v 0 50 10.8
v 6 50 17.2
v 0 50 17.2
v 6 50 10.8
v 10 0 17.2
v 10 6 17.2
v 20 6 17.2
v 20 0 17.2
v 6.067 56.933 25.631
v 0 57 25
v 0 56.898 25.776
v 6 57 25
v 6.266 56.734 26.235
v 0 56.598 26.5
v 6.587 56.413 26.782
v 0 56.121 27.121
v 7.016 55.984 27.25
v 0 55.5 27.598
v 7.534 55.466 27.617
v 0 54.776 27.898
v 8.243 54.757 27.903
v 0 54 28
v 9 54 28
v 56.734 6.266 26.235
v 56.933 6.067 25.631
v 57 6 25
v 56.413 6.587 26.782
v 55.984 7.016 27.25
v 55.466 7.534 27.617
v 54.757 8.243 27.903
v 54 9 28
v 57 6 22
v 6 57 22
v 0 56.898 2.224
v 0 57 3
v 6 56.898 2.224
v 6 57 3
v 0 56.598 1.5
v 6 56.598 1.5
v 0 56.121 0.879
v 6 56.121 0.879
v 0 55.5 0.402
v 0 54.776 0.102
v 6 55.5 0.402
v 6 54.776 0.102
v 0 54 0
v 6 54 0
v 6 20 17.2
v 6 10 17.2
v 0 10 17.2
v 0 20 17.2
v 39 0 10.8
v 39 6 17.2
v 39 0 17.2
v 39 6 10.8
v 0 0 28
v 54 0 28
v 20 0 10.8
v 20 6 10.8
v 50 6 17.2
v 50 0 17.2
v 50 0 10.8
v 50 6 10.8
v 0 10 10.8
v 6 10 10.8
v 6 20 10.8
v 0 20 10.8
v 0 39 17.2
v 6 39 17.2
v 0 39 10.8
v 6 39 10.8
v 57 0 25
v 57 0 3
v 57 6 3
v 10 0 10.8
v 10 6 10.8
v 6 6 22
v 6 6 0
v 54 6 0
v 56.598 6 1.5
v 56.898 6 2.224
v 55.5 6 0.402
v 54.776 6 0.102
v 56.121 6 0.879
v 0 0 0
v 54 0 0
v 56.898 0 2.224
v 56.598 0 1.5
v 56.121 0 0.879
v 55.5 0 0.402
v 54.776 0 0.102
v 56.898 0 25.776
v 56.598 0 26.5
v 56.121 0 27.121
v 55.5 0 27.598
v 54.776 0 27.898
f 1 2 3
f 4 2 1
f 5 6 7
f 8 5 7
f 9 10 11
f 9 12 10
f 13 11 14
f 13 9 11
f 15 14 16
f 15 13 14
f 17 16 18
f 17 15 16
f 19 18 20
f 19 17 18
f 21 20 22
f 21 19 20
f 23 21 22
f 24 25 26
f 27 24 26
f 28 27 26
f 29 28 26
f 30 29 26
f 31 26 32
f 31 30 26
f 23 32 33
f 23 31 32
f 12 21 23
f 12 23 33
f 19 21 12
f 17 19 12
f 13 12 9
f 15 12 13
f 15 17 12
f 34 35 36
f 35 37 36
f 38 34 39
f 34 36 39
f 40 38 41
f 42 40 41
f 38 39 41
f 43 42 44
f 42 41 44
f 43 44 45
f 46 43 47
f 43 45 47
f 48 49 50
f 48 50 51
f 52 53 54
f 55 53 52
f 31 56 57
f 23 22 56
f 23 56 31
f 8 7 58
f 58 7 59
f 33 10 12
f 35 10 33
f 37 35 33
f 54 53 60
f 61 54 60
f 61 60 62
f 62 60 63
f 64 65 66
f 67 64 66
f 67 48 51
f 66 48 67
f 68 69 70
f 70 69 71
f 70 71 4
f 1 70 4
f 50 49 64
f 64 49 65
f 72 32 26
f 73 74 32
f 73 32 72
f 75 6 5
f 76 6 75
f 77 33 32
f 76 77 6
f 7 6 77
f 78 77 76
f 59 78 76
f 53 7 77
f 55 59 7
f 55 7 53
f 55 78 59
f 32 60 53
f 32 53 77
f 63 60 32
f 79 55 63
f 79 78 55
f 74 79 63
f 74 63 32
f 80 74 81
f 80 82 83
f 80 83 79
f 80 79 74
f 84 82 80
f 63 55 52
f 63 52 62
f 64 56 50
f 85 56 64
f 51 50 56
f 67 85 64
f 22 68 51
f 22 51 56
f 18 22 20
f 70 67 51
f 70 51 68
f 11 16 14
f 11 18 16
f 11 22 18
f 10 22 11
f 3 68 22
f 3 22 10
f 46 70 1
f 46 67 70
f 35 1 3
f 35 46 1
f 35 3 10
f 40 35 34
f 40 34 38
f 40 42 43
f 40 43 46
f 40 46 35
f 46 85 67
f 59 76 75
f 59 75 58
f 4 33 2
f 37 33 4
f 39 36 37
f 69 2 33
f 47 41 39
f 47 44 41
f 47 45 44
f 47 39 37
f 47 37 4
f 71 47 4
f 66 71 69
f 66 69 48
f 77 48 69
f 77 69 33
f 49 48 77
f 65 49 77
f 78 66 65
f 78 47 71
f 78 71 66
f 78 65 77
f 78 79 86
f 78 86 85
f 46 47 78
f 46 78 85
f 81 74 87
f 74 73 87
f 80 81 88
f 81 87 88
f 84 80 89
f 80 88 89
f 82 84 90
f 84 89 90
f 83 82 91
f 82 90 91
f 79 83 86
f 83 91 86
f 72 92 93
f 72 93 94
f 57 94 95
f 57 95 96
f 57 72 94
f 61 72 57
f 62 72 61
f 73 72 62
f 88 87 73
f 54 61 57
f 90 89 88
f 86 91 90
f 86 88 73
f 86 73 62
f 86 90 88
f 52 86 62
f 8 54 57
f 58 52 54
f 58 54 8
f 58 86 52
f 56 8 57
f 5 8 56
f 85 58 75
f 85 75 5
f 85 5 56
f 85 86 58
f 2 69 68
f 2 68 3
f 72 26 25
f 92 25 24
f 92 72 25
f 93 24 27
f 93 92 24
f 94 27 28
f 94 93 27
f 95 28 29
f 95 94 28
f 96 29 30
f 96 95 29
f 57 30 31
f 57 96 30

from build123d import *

# Parameters (mm, degrees)
AUFSATZ_LINEAR_AUSTRAGEN1_DEPTH = 28
AUFSATZ_LINEAR_AUSTRAGEN2_DEPTH = 6
SKIZZE3_W                       = 6.4
SKIZZE3_H                       = 11
SKIZZE3_H_2                     = 10
SCHNITT_LINEAR_AUSTRAGEN1_DEPTH = 7
SKIZZE4_W                       = 11
SKIZZE4_H                       = 6.4
SKIZZE4_W_2                     = 10
SCHNITT_LINEAR_AUSTRAGEN2_DEPTH = 7
VERRUNDUNG1_R                   = 3


with BuildPart() as part:
    # Skizze1 → Aufsatz-Linear austragen1 (new body)
    with BuildSketch(Plane.XY):
        Polygon((0, 0), (0, 57), (6, 57), (6, 6), (57, 6), (57, 0), align=None)
    extrude(amount=AUFSATZ_LINEAR_AUSTRAGEN1_DEPTH)

    # Skizze2 → Aufsatz-Linear austragen2 (add)
    with BuildSketch(Plane.XY.offset(28)):
        Polygon((6, 57), (6, 6), (57, 6), align=None)
    extrude(amount=-AUFSATZ_LINEAR_AUSTRAGEN2_DEPTH)

    # Skizze3 → Schnitt-Linear austragen1 (cut, through all)
    with BuildSketch(Plane(origin=(6, 0, 0), x_dir=(0, 0, -1), z_dir=(1, 0, 0))):
        with Locations((-14, 44.5)):
            Rectangle(SKIZZE3_W, SKIZZE3_H)
        with Locations((-14, 15)):
            Rectangle(SKIZZE3_W, SKIZZE3_H_2)
    extrude(amount=-SCHNITT_LINEAR_AUSTRAGEN1_DEPTH, mode=Mode.SUBTRACT)

    # Skizze4 → Schnitt-Linear austragen2 (cut, through all)
    with BuildSketch(Plane(origin=(0, 6, 0), x_dir=(1, 0, 0), z_dir=(0, 1, 0))):
        with Locations((44.5, -14)):
            Rectangle(SKIZZE4_W, SKIZZE4_H)
        with Locations((15, -14)):
            Rectangle(SKIZZE4_W_2, SKIZZE4_H)
    extrude(amount=-SCHNITT_LINEAR_AUSTRAGEN2_DEPTH, mode=Mode.SUBTRACT)

    # Verrundung1
    verrundung1_edges = [part.edges().sort_by_distance(p)[0] for p in [
        (3, 57, 28),
        (3, 57, 0),
        (57, 3, 28),
        (57, 3, 0),
    ]]
    fillet(verrundung1_edges, radius=VERRUNDUNG1_R)


solid = part.part
